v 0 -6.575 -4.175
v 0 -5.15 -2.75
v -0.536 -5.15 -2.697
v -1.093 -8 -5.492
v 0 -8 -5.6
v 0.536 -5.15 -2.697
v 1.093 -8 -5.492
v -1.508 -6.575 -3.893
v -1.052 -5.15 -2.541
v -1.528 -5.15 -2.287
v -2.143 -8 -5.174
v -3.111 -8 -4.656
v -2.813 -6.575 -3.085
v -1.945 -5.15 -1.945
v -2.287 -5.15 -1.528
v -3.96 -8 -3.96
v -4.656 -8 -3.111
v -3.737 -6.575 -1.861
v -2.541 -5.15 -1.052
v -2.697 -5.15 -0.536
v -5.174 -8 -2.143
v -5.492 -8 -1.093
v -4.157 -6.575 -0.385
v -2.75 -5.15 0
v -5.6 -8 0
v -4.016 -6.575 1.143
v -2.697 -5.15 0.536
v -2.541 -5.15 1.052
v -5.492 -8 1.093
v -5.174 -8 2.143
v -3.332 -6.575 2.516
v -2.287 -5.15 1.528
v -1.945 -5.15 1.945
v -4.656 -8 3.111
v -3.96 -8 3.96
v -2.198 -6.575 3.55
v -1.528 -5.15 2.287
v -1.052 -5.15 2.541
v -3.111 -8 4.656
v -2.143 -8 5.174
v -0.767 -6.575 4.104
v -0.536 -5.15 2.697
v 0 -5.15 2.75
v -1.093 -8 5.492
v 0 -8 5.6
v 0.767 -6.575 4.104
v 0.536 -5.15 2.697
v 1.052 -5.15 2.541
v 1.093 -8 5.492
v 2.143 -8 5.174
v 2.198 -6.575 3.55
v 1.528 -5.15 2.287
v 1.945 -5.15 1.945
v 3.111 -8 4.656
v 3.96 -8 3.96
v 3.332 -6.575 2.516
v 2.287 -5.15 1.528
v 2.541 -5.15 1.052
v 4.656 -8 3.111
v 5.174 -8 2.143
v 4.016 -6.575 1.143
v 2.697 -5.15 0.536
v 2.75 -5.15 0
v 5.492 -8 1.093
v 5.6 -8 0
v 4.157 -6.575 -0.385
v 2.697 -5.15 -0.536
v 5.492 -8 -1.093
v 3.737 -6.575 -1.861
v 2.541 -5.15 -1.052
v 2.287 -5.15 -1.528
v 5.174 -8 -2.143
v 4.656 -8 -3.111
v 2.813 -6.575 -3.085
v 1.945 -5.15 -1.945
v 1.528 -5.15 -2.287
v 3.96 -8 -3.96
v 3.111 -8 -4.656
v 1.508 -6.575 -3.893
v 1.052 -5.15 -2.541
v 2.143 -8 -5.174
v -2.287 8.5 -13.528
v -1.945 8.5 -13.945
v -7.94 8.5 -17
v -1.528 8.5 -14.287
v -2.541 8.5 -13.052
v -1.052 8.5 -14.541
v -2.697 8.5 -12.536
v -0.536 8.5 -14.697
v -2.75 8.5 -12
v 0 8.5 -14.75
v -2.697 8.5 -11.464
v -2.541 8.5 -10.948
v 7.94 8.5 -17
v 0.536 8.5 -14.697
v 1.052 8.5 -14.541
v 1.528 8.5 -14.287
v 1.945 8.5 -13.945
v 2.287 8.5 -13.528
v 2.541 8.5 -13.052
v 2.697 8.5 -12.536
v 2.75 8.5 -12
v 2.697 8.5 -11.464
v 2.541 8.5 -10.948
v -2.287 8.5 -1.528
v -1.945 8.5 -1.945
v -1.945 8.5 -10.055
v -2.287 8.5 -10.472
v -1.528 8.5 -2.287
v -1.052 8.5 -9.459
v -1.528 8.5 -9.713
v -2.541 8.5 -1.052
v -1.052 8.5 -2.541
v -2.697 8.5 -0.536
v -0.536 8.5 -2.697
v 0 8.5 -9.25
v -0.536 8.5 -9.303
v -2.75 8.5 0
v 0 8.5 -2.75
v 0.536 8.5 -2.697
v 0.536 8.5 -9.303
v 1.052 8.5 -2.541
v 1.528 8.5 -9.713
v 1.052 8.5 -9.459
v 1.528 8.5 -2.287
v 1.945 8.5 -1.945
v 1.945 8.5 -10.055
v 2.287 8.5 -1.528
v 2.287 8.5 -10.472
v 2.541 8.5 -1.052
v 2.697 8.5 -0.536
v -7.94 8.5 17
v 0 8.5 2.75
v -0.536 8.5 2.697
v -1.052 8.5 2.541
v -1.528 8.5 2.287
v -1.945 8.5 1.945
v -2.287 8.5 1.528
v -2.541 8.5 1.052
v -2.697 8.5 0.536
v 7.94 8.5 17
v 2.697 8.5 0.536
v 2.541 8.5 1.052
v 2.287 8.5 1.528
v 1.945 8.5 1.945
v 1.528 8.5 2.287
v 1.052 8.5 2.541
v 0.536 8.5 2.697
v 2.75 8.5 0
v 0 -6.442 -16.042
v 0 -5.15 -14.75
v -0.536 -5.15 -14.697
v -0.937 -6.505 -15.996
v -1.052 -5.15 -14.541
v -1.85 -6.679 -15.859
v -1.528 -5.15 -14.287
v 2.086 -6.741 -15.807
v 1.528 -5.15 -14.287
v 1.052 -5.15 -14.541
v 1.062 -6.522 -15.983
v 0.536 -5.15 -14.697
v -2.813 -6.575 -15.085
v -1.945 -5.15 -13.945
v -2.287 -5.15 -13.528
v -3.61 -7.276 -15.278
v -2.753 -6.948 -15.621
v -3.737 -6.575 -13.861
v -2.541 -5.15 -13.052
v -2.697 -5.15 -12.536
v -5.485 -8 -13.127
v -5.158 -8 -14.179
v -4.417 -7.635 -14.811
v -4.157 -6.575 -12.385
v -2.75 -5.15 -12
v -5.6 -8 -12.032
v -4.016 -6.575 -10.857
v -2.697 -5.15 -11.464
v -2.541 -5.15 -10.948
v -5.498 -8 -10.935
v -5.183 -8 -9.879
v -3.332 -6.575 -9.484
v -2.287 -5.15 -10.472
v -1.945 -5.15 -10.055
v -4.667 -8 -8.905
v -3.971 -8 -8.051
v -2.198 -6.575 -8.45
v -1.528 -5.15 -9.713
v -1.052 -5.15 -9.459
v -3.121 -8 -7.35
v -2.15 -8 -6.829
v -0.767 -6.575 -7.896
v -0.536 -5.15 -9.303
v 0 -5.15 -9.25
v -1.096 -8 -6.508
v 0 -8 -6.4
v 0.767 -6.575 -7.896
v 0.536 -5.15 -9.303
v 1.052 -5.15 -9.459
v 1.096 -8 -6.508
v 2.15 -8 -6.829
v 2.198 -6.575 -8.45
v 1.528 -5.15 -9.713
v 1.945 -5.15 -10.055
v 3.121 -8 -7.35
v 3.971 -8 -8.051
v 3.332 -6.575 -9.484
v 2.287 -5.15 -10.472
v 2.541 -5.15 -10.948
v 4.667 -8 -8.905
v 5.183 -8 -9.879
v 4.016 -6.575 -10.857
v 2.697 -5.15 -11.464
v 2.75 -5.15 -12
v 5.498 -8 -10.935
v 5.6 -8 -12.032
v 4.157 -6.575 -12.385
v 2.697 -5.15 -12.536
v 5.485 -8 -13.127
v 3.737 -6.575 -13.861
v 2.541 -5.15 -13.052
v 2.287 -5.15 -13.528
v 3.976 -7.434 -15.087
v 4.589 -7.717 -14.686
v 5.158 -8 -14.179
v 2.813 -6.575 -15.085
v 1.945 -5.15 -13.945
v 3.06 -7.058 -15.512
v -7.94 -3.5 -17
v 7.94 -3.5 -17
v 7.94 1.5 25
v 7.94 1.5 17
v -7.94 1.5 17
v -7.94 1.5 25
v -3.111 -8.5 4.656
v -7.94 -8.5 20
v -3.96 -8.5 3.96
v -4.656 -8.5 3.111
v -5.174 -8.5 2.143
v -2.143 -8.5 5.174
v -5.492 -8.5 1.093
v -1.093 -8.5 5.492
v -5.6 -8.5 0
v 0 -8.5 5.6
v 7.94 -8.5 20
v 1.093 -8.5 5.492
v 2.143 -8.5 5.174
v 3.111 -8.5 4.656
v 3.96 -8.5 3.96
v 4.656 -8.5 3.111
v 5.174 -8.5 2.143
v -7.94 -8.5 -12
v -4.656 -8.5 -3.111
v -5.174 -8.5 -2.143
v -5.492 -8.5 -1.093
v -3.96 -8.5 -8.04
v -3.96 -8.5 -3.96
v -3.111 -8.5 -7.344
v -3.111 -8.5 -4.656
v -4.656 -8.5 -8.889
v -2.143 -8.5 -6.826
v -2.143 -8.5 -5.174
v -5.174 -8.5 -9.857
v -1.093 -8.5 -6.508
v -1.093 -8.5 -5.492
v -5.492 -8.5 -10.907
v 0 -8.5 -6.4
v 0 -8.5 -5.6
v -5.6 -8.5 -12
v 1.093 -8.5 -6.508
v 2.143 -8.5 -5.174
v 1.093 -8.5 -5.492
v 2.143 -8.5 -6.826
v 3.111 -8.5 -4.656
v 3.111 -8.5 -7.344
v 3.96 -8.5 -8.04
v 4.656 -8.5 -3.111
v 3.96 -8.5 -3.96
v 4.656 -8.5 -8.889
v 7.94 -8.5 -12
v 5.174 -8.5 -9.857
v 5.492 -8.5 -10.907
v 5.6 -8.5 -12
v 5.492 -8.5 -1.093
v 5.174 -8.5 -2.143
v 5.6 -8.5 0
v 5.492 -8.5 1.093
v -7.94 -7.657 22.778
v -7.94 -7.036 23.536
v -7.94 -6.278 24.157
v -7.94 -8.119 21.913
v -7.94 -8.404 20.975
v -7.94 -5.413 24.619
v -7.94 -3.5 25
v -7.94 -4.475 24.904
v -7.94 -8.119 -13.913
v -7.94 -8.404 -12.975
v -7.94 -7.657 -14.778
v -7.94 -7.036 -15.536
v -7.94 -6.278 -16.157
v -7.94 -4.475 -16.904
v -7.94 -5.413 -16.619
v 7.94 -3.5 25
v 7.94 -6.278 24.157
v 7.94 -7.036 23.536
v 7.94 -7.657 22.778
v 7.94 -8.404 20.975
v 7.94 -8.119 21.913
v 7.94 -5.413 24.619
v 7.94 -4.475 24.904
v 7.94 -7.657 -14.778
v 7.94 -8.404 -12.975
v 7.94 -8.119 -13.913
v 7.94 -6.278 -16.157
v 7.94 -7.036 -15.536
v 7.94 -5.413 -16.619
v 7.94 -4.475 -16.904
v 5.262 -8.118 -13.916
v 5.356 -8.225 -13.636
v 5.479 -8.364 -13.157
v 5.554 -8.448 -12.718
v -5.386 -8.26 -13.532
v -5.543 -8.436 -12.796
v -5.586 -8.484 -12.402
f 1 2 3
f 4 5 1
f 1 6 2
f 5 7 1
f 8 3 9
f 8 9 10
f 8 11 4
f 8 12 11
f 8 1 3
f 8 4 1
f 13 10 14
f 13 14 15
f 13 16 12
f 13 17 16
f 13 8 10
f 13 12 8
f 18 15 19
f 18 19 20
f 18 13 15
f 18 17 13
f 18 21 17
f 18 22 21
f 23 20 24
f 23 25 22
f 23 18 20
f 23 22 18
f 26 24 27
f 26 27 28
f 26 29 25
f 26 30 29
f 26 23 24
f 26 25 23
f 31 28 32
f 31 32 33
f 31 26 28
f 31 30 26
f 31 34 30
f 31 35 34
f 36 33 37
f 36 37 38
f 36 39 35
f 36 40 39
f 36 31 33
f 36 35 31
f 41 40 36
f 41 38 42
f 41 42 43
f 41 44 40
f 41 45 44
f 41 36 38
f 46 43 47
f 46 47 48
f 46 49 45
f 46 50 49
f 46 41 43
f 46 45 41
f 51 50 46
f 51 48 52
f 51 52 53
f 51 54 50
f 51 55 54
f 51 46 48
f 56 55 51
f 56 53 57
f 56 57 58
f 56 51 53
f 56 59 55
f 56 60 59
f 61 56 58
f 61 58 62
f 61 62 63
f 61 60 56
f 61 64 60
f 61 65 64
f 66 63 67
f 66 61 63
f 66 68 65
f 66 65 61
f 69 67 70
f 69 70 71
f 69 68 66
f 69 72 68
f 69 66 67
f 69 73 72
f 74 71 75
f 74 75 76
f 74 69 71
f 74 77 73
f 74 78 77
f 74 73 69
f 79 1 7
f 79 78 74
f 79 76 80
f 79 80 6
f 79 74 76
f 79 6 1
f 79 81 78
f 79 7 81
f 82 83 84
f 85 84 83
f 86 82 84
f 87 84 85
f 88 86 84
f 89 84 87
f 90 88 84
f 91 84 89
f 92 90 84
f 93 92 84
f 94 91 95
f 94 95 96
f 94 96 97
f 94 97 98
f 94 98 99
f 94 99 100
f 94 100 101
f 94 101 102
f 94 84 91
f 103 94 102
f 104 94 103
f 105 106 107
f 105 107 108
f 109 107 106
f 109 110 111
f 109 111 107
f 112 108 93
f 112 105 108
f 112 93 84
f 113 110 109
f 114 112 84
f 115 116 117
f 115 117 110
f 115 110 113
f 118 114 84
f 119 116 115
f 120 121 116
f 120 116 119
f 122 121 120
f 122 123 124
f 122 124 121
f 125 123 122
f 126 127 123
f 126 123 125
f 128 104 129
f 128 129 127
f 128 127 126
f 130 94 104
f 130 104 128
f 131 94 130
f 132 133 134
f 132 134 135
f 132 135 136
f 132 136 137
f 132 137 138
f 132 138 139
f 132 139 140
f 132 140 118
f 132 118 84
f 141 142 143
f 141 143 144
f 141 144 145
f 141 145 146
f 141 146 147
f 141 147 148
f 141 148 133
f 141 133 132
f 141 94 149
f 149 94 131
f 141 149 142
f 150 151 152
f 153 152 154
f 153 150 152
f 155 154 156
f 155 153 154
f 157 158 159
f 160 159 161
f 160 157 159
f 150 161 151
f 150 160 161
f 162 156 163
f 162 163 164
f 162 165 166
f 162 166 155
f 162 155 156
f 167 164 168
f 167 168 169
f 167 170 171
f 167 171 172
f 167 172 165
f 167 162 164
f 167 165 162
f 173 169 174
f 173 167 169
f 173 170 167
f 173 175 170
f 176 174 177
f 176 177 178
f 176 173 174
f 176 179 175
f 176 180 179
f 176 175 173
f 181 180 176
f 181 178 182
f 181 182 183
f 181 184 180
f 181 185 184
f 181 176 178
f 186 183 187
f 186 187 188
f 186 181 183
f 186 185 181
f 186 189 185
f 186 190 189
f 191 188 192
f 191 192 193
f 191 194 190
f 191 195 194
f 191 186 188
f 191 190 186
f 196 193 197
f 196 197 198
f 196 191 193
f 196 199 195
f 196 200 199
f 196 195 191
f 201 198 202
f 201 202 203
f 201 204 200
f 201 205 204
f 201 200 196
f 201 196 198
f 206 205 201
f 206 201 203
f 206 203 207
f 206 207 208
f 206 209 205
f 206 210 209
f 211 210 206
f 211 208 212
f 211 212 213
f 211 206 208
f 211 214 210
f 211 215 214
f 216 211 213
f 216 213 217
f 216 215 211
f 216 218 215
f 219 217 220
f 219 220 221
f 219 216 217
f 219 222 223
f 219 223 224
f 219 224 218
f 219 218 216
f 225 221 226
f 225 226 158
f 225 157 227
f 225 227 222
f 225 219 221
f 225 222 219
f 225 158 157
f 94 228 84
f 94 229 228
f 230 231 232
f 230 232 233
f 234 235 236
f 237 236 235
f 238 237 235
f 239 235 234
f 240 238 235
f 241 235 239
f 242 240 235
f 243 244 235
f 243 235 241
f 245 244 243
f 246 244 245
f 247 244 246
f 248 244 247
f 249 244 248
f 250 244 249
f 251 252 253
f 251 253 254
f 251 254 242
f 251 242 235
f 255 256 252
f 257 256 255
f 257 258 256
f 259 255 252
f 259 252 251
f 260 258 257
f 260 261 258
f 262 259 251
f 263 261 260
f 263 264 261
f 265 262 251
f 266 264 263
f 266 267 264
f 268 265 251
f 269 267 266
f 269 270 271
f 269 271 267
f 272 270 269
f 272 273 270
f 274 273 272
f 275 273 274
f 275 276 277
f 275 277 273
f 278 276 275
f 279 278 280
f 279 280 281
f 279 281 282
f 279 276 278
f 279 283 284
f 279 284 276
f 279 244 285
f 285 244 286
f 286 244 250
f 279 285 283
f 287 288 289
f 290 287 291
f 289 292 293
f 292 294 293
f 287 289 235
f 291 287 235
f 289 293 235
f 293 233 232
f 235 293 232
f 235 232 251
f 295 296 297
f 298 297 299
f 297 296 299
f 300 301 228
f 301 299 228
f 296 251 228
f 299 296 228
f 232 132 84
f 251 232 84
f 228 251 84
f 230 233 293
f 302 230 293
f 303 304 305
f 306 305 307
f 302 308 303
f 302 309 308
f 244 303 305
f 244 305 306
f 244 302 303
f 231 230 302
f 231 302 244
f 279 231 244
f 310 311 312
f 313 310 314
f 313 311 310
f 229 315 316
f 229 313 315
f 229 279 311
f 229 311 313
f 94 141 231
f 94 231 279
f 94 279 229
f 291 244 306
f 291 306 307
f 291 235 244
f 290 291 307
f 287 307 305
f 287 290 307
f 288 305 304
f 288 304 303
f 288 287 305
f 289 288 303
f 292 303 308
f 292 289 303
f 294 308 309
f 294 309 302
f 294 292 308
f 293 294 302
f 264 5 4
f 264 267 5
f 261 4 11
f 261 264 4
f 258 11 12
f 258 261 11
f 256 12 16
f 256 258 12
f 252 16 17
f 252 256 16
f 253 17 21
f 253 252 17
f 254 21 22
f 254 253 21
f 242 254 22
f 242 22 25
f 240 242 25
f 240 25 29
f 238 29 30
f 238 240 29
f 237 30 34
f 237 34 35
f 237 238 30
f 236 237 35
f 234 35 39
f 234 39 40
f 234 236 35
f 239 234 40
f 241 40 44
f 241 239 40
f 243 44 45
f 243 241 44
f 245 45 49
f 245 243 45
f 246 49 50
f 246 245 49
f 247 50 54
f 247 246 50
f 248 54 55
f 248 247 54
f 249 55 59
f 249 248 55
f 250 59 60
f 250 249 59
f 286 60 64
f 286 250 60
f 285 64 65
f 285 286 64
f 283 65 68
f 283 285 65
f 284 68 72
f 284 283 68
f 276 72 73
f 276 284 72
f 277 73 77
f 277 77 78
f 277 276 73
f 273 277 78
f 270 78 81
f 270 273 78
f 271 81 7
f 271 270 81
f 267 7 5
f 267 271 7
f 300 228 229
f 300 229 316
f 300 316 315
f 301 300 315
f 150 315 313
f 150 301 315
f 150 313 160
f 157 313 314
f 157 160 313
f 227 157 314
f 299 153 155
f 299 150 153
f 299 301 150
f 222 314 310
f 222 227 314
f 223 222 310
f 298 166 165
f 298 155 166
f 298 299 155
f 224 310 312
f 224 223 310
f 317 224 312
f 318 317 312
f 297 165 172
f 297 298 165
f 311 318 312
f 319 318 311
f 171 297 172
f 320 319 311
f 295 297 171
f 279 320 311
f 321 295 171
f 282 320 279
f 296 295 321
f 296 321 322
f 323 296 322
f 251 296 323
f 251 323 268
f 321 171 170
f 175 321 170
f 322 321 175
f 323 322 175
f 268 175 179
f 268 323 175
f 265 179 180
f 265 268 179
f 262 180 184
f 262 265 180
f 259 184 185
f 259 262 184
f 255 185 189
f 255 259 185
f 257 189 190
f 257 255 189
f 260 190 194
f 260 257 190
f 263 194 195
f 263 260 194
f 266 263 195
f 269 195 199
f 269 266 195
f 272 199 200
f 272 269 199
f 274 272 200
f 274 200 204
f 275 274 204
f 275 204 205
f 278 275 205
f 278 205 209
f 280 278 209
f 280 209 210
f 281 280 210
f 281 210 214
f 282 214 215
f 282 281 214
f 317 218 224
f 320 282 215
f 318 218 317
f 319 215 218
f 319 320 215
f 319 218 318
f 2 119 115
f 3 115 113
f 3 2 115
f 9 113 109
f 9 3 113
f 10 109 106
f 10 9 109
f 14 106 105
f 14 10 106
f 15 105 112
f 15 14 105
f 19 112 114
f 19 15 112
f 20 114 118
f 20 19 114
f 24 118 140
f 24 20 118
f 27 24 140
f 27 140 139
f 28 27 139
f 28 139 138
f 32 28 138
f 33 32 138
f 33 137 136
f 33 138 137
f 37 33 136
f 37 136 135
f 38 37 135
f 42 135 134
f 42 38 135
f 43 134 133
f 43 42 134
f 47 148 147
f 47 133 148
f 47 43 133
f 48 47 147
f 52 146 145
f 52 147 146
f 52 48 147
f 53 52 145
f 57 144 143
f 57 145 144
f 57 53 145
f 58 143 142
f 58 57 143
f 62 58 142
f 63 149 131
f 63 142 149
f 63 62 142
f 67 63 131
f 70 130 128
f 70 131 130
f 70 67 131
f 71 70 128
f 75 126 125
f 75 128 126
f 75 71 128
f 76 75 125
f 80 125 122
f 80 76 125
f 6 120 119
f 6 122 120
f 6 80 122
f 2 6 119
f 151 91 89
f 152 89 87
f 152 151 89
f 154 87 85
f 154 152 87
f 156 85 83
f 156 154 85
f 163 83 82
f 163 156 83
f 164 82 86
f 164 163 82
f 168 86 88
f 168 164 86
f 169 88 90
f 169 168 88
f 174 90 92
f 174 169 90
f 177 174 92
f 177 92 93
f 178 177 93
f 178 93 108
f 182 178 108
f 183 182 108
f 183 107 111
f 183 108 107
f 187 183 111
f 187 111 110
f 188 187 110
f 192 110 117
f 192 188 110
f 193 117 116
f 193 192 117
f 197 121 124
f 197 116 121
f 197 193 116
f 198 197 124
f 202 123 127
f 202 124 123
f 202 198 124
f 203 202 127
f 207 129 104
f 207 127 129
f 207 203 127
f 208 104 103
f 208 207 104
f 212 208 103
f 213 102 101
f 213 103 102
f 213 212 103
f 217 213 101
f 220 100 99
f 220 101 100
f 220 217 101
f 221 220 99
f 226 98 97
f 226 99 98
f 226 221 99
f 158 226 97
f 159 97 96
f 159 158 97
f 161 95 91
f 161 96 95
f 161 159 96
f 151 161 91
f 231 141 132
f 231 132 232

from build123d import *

# Parameters (mm, degrees)
RESSALTO_EXTRUS_O1_DEPTH            = 7.94
FILETE1_R                           = 5
ESCAREADO_PARA_SFHCS_M51_AT_2_COUNT = 2
ESCAREADO_PARA_SFHCS_M51_AT_2_PITCH = 12
ESCAREADO_PARA_SFHCS_M51_AT_3_COUNT = 2
ESCAREADO_PARA_SFHCS_M51_AT_3_PITCH = 67.209946437
ESCAREADO_PARA_SFHCS_M51_AT_4_COUNT = 2
ESCAREADO_PARA_SFHCS_M51_AT_4_PITCH = 66.13


with BuildPart() as part:
    # Esboço1 → Ressalto-extrusão1 (new, symmetric)
    with BuildSketch(Plane(origin=(0, 0, 0), x_dir=(0, 0, -1), z_dir=(1, 0, 0))):
        Polygon((-17, -8.5), (17, -8.5), (17, 8.5), (-17, 8.5), (-17, 1.5), (-25, 1.5), (-25, -8.5), align=None)
    extrude(amount=RESSALTO_EXTRUS_O1_DEPTH, both=True)

    # Filete1
    filete1_edges = [part.edges().sort_by_distance(p)[0] for p in [
        (0, -8.5, -17),
        (0, -8.5, 25),
    ]]
    fillet(filete1_edges, radius=FILETE1_R)

    # Esboço3 → Escareado para SFHCS M51 (revolve, cut)
    with BuildSketch(Plane(origin=(0, -8.5, -12), x_dir=(0, 0, -1), z_dir=(1, 0, 0))):
        Polygon((0, 0), (0, 31.652366702), (2.75, 30), (2.75, 3.35), (5.6, 0.5), (5.6, 0), align=None)
    escareado_para_sfhcs_m51 = revolve(axis=Axis((0, -14.85, -12), (0, 1, 0)), mode=Mode.SUBTRACT)

    # Escareado para SFHCS M51 at 2: Escareado para SFHCS M51 ×2
    with Locations(*[(0, 0, i * ESCAREADO_PARA_SFHCS_M51_AT_2_PITCH) for i in range(1, ESCAREADO_PARA_SFHCS_M51_AT_2_COUNT)]):
        add(escareado_para_sfhcs_m51, mode=Mode.SUBTRACT)

    # Escareado para SFHCS M51 at 3: Escareado para SFHCS M51 ×2
    with Locations(*[Vector(-0.9839317468056482, 0, 0.17854500168861018) * (i * ESCAREADO_PARA_SFHCS_M51_AT_3_PITCH) for i in range(1, ESCAREADO_PARA_SFHCS_M51_AT_3_COUNT)]):
        add(escareado_para_sfhcs_m51, mode=Mode.SUBTRACT)

    # Escareado para SFHCS M51 at 4: Escareado para SFHCS M51 ×2
    with Locations(*[(-i * ESCAREADO_PARA_SFHCS_M51_AT_4_PITCH, 0, 0) for i in range(1, ESCAREADO_PARA_SFHCS_M51_AT_4_COUNT)]):
        add(escareado_para_sfhcs_m51, mode=Mode.SUBTRACT)


solid = part.part
